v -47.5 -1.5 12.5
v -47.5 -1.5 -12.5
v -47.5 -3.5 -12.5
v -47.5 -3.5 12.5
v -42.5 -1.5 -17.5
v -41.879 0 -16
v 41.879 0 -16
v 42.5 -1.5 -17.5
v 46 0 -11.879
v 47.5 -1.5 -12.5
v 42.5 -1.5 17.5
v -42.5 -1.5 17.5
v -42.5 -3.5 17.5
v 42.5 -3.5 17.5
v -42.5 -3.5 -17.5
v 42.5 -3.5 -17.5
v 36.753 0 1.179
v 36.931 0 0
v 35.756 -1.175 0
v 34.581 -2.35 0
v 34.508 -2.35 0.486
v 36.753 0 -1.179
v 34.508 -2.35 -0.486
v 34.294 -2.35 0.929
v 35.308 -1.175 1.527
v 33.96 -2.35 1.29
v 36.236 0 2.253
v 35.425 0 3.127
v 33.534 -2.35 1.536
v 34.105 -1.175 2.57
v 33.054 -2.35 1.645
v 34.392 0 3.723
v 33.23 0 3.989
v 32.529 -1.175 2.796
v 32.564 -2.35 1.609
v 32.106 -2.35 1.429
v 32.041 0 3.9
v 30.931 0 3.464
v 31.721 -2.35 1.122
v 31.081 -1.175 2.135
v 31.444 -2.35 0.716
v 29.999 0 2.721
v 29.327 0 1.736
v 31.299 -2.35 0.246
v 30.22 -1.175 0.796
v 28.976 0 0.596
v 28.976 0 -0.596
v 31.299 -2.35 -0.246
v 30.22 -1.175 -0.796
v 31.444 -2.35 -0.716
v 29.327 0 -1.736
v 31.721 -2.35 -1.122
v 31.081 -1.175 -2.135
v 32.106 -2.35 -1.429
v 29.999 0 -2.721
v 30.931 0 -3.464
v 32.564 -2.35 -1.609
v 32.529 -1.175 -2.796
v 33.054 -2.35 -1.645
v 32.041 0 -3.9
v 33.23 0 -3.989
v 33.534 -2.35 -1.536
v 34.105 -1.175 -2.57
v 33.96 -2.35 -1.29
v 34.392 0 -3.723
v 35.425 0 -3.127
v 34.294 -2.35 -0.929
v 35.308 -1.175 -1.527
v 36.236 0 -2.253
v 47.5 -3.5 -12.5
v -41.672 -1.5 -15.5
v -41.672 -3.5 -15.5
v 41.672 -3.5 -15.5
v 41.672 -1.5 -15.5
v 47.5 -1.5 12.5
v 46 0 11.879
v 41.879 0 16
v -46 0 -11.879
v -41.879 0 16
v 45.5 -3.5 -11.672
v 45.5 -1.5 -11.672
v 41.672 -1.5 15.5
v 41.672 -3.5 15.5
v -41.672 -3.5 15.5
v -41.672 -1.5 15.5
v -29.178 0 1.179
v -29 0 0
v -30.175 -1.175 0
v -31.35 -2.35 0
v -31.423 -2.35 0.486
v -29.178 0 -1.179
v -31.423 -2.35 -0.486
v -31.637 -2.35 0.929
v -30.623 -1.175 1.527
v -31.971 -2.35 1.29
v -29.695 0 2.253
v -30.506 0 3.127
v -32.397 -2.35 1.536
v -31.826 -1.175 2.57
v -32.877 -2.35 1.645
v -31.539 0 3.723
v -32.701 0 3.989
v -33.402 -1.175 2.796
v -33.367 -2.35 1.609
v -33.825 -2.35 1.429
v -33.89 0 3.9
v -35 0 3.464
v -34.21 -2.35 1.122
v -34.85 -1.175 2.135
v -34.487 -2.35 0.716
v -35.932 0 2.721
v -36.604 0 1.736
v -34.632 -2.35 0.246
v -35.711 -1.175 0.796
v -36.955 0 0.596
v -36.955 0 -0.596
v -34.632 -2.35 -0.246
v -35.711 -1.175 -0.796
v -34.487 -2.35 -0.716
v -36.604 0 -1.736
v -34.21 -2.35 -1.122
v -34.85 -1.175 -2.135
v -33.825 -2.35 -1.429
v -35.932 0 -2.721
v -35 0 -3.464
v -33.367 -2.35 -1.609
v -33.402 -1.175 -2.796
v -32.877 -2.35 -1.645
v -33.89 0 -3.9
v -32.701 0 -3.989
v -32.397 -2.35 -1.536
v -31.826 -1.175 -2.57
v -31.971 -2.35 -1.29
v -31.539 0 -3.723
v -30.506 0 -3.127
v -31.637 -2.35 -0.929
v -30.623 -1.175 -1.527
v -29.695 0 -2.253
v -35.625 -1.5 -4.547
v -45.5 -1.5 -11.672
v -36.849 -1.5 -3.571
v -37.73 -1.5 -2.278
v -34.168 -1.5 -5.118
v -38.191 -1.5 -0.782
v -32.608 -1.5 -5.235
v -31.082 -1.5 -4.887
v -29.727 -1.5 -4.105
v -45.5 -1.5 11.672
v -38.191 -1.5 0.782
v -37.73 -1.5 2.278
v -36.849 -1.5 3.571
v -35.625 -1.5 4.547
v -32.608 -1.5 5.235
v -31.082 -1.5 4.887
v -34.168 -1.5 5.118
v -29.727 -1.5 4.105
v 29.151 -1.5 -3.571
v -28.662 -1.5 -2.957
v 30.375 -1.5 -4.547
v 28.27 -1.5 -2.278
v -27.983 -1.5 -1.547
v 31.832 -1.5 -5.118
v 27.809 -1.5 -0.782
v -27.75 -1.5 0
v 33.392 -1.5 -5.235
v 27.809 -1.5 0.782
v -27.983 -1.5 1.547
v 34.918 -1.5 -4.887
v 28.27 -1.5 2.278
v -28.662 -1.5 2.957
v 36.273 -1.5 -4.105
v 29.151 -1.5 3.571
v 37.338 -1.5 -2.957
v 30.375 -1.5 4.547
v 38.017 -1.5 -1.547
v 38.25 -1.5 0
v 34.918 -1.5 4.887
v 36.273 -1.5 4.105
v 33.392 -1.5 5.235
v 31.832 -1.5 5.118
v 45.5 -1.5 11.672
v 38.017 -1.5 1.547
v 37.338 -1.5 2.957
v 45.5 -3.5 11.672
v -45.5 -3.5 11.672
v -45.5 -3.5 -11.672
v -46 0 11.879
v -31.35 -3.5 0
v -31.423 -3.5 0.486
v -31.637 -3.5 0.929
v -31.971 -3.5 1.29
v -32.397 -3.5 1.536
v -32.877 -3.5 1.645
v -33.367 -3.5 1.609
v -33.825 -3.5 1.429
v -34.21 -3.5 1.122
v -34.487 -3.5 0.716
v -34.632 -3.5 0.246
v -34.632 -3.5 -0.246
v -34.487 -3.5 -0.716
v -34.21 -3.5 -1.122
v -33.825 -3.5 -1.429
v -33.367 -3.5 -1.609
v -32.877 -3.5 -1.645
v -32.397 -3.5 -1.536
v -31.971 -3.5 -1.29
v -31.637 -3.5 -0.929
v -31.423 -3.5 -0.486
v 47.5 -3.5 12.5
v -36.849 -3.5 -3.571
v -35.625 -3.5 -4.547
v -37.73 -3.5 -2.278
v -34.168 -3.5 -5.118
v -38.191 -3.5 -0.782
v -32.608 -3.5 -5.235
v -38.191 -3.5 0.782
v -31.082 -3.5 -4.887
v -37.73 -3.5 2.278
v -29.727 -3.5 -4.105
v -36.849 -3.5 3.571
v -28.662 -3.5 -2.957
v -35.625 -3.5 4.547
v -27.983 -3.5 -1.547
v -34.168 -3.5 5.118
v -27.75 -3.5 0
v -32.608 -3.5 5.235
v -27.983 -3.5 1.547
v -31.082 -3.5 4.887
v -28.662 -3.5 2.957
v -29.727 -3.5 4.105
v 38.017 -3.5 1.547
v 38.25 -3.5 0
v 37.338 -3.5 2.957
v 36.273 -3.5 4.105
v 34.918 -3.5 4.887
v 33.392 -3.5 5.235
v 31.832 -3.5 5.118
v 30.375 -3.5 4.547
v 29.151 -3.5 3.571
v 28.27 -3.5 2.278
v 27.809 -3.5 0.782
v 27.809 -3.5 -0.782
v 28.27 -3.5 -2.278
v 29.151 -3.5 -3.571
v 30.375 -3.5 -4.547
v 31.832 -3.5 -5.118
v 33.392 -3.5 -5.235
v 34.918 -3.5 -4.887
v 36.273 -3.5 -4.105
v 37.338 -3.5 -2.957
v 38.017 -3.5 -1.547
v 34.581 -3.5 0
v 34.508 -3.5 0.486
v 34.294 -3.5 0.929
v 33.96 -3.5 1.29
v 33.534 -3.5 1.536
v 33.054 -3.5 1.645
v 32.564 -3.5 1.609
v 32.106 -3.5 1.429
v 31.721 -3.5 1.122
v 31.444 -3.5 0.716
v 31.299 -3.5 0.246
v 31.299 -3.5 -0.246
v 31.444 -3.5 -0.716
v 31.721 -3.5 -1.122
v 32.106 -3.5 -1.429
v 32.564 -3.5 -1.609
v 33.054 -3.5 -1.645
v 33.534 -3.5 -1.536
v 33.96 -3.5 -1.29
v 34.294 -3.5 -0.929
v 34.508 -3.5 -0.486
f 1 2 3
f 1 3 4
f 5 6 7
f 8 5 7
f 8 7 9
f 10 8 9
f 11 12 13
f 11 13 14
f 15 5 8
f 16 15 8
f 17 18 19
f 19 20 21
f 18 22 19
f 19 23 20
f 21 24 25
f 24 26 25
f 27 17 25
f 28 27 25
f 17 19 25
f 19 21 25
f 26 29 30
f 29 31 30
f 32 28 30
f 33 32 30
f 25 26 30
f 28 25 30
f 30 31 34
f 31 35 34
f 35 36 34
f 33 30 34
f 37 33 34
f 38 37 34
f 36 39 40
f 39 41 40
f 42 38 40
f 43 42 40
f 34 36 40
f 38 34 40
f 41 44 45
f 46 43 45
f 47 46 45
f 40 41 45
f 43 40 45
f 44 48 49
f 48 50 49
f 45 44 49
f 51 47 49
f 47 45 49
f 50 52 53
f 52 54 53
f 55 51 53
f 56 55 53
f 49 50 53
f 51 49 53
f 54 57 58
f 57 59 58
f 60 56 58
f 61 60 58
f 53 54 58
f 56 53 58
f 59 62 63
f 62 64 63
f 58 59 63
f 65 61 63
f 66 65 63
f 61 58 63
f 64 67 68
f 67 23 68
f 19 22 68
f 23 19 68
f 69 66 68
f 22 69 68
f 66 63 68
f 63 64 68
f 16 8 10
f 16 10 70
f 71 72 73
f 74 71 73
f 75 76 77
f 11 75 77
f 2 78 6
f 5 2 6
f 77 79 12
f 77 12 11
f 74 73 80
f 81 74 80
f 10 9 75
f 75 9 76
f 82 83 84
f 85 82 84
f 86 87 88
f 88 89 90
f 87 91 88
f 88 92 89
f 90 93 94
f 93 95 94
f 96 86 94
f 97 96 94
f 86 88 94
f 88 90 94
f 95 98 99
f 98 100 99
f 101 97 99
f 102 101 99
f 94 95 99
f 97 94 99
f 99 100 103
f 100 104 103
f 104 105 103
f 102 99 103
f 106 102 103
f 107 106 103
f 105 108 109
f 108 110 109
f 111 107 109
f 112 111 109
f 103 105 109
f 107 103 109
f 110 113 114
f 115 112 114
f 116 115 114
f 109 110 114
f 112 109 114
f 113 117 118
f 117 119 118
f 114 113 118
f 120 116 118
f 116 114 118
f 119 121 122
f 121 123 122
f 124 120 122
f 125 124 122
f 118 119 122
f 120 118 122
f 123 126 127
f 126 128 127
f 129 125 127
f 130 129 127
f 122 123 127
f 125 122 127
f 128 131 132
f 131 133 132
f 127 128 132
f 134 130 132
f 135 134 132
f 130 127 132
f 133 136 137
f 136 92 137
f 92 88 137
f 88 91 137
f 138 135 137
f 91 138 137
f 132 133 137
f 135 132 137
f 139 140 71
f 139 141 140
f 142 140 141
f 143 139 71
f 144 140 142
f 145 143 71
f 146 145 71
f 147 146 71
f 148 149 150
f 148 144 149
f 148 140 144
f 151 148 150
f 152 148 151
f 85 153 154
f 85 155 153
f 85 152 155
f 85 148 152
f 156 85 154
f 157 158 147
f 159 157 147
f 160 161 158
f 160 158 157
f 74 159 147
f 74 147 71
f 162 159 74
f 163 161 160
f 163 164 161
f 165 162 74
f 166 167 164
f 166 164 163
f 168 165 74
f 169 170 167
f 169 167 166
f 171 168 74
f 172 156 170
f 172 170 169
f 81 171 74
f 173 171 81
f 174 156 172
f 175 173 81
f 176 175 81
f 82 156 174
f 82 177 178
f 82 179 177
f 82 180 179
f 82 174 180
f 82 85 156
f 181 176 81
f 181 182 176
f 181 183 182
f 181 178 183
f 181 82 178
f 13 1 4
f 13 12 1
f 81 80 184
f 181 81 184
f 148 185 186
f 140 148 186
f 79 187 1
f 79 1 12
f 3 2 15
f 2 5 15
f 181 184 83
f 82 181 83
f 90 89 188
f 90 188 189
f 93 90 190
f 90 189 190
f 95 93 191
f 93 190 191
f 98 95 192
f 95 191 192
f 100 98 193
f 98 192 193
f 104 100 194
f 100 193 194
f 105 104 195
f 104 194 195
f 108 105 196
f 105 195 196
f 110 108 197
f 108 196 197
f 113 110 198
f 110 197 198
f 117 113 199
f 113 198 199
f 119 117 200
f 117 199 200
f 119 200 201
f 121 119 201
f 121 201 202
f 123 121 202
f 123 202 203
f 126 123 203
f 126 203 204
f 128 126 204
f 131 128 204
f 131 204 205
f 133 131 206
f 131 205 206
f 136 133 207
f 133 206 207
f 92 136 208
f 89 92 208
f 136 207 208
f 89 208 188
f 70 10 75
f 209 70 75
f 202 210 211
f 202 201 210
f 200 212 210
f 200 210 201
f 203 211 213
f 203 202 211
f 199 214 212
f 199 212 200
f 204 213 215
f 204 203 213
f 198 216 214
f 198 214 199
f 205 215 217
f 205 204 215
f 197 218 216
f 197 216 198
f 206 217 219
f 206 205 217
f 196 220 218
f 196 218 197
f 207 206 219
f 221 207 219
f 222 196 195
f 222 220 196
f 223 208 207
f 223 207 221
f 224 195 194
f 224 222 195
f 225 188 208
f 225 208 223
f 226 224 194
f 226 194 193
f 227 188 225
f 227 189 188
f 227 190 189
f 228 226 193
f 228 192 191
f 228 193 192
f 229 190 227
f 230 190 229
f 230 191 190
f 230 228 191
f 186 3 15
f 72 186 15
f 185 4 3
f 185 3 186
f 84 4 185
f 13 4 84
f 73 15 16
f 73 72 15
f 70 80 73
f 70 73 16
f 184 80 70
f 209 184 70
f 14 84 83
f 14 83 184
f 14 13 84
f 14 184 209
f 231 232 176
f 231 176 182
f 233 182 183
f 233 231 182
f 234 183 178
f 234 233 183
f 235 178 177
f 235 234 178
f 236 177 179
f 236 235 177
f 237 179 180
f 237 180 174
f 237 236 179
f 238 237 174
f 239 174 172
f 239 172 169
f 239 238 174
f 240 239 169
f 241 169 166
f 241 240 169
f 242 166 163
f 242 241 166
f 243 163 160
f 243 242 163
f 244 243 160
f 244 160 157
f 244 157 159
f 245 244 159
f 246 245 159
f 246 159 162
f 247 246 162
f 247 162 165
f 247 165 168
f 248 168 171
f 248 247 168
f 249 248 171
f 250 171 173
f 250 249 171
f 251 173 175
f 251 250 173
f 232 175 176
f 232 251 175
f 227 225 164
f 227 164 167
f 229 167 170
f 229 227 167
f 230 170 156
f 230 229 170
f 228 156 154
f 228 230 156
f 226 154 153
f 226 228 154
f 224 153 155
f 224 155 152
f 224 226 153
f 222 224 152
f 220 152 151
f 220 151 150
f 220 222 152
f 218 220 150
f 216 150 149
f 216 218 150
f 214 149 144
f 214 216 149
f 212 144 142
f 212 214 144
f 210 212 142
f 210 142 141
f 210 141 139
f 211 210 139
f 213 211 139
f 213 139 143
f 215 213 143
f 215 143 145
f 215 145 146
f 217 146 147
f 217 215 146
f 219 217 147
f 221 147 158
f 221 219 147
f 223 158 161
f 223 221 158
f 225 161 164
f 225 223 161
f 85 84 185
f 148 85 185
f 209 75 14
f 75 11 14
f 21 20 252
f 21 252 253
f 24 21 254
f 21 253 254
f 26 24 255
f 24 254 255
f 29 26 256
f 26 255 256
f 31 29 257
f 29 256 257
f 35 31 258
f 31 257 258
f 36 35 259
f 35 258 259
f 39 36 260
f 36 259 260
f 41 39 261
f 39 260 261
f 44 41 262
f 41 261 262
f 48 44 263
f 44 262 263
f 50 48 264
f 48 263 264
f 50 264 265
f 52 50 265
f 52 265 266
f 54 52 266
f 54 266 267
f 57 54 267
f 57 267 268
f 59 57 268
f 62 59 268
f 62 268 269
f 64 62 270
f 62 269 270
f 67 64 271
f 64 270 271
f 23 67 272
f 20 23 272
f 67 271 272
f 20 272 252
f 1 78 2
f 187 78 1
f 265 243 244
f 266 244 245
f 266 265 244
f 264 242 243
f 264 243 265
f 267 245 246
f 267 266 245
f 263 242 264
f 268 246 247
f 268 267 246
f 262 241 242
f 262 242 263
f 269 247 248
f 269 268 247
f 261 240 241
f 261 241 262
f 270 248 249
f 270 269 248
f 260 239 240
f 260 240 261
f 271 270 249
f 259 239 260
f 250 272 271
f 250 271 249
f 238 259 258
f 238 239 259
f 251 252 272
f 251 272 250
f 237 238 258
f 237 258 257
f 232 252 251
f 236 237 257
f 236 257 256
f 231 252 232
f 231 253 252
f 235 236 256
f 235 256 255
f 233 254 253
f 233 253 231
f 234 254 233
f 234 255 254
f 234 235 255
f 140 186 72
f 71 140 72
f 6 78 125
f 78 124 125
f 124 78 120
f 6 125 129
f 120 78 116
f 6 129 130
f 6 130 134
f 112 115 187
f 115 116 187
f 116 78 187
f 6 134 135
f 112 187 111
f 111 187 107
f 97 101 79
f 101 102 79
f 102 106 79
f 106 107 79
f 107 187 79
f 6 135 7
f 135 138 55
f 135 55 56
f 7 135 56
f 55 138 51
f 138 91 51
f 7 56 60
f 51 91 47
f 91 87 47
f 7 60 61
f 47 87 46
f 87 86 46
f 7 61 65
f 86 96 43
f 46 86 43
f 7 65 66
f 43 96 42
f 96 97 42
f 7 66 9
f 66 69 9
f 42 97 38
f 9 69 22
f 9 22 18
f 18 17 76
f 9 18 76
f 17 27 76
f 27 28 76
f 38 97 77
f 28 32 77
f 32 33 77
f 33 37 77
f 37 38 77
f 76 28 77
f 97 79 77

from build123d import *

# Parameters (mm, degrees)
F0_W           = 95
F0_H           = 35
F1_DEPTH       = 3.5
F2_SIZE        = 5
F4_DEPTH       = 2
F5_R           = 5.25
F7_DEPTH       = 2
F8_D           = 3.3
F8_CSINK_D     = 8
F8_CSINK_ANGLE = 90
F9_SIZE        = 1.5


with BuildPart() as f1:
    # F0 (on Front) → F1 (new body)
    with BuildSketch(Plane.XZ):
        Rectangle(F0_W, F0_H)
    extrude(amount=F1_DEPTH)

    # F2
    f2_edges = [f1.edges().sort_by_distance(p)[0] for p in [
        (47.5, -1.75, -17.5),
        (47.5, -1.75, 17.5),
        (-47.5, -1.75, -17.5),
        (-47.5, -1.75, 17.5),
    ]]
    chamfer(f2_edges, length=F2_SIZE)

    # F3 (on face) → F4 (cut)
    with BuildSketch(Plane.XZ.offset(3.5)):
        Polygon((41.6715728753, 15.5), (-41.6715728753, 15.5), (-45.5, 11.6715728753), (-45.5, -11.6715728753), (-41.6715728753, -15.5), (41.6715728753, -15.5), (45.5, -11.6715728753), (45.5, 11.6715728753), align=None)
    extrude(amount=-F4_DEPTH, mode=Mode.SUBTRACT)

    # F5 (on face) → F7 (join, through all)
    with BuildSketch(Plane.XZ.offset(3.5)):
        with Locations((33, 0)):
            Circle(F5_R)
        with Locations((-33, 0)):
            Circle(F5_R)
    extrude(amount=-F7_DEPTH)

    # F8 (through all)
    with Locations(Plane(origin=(0, 0, 0), x_dir=(-1, 0, 0), z_dir=(0, 1, 0))):
        with Locations((33, 0), (-32.9310148954, 0)):
            CounterSinkHole(F8_D / 2, F8_CSINK_D / 2, counter_sink_angle=F8_CSINK_ANGLE)

    # F9
    f9_edges = [f1.edges().sort_by_distance(p)[0] for p in [
        (0, 0, -17.5),
        (45, 0, -15),
        (47.5, 0, 0),
        (45, 0, 15),
        (0, 0, 17.5),
        (-45, 0, 15),
        (-45, 0, -15),
        (-47.5, 0, 0),
    ]]
    chamfer(f9_edges, length=F9_SIZE)


solid = f1.part
